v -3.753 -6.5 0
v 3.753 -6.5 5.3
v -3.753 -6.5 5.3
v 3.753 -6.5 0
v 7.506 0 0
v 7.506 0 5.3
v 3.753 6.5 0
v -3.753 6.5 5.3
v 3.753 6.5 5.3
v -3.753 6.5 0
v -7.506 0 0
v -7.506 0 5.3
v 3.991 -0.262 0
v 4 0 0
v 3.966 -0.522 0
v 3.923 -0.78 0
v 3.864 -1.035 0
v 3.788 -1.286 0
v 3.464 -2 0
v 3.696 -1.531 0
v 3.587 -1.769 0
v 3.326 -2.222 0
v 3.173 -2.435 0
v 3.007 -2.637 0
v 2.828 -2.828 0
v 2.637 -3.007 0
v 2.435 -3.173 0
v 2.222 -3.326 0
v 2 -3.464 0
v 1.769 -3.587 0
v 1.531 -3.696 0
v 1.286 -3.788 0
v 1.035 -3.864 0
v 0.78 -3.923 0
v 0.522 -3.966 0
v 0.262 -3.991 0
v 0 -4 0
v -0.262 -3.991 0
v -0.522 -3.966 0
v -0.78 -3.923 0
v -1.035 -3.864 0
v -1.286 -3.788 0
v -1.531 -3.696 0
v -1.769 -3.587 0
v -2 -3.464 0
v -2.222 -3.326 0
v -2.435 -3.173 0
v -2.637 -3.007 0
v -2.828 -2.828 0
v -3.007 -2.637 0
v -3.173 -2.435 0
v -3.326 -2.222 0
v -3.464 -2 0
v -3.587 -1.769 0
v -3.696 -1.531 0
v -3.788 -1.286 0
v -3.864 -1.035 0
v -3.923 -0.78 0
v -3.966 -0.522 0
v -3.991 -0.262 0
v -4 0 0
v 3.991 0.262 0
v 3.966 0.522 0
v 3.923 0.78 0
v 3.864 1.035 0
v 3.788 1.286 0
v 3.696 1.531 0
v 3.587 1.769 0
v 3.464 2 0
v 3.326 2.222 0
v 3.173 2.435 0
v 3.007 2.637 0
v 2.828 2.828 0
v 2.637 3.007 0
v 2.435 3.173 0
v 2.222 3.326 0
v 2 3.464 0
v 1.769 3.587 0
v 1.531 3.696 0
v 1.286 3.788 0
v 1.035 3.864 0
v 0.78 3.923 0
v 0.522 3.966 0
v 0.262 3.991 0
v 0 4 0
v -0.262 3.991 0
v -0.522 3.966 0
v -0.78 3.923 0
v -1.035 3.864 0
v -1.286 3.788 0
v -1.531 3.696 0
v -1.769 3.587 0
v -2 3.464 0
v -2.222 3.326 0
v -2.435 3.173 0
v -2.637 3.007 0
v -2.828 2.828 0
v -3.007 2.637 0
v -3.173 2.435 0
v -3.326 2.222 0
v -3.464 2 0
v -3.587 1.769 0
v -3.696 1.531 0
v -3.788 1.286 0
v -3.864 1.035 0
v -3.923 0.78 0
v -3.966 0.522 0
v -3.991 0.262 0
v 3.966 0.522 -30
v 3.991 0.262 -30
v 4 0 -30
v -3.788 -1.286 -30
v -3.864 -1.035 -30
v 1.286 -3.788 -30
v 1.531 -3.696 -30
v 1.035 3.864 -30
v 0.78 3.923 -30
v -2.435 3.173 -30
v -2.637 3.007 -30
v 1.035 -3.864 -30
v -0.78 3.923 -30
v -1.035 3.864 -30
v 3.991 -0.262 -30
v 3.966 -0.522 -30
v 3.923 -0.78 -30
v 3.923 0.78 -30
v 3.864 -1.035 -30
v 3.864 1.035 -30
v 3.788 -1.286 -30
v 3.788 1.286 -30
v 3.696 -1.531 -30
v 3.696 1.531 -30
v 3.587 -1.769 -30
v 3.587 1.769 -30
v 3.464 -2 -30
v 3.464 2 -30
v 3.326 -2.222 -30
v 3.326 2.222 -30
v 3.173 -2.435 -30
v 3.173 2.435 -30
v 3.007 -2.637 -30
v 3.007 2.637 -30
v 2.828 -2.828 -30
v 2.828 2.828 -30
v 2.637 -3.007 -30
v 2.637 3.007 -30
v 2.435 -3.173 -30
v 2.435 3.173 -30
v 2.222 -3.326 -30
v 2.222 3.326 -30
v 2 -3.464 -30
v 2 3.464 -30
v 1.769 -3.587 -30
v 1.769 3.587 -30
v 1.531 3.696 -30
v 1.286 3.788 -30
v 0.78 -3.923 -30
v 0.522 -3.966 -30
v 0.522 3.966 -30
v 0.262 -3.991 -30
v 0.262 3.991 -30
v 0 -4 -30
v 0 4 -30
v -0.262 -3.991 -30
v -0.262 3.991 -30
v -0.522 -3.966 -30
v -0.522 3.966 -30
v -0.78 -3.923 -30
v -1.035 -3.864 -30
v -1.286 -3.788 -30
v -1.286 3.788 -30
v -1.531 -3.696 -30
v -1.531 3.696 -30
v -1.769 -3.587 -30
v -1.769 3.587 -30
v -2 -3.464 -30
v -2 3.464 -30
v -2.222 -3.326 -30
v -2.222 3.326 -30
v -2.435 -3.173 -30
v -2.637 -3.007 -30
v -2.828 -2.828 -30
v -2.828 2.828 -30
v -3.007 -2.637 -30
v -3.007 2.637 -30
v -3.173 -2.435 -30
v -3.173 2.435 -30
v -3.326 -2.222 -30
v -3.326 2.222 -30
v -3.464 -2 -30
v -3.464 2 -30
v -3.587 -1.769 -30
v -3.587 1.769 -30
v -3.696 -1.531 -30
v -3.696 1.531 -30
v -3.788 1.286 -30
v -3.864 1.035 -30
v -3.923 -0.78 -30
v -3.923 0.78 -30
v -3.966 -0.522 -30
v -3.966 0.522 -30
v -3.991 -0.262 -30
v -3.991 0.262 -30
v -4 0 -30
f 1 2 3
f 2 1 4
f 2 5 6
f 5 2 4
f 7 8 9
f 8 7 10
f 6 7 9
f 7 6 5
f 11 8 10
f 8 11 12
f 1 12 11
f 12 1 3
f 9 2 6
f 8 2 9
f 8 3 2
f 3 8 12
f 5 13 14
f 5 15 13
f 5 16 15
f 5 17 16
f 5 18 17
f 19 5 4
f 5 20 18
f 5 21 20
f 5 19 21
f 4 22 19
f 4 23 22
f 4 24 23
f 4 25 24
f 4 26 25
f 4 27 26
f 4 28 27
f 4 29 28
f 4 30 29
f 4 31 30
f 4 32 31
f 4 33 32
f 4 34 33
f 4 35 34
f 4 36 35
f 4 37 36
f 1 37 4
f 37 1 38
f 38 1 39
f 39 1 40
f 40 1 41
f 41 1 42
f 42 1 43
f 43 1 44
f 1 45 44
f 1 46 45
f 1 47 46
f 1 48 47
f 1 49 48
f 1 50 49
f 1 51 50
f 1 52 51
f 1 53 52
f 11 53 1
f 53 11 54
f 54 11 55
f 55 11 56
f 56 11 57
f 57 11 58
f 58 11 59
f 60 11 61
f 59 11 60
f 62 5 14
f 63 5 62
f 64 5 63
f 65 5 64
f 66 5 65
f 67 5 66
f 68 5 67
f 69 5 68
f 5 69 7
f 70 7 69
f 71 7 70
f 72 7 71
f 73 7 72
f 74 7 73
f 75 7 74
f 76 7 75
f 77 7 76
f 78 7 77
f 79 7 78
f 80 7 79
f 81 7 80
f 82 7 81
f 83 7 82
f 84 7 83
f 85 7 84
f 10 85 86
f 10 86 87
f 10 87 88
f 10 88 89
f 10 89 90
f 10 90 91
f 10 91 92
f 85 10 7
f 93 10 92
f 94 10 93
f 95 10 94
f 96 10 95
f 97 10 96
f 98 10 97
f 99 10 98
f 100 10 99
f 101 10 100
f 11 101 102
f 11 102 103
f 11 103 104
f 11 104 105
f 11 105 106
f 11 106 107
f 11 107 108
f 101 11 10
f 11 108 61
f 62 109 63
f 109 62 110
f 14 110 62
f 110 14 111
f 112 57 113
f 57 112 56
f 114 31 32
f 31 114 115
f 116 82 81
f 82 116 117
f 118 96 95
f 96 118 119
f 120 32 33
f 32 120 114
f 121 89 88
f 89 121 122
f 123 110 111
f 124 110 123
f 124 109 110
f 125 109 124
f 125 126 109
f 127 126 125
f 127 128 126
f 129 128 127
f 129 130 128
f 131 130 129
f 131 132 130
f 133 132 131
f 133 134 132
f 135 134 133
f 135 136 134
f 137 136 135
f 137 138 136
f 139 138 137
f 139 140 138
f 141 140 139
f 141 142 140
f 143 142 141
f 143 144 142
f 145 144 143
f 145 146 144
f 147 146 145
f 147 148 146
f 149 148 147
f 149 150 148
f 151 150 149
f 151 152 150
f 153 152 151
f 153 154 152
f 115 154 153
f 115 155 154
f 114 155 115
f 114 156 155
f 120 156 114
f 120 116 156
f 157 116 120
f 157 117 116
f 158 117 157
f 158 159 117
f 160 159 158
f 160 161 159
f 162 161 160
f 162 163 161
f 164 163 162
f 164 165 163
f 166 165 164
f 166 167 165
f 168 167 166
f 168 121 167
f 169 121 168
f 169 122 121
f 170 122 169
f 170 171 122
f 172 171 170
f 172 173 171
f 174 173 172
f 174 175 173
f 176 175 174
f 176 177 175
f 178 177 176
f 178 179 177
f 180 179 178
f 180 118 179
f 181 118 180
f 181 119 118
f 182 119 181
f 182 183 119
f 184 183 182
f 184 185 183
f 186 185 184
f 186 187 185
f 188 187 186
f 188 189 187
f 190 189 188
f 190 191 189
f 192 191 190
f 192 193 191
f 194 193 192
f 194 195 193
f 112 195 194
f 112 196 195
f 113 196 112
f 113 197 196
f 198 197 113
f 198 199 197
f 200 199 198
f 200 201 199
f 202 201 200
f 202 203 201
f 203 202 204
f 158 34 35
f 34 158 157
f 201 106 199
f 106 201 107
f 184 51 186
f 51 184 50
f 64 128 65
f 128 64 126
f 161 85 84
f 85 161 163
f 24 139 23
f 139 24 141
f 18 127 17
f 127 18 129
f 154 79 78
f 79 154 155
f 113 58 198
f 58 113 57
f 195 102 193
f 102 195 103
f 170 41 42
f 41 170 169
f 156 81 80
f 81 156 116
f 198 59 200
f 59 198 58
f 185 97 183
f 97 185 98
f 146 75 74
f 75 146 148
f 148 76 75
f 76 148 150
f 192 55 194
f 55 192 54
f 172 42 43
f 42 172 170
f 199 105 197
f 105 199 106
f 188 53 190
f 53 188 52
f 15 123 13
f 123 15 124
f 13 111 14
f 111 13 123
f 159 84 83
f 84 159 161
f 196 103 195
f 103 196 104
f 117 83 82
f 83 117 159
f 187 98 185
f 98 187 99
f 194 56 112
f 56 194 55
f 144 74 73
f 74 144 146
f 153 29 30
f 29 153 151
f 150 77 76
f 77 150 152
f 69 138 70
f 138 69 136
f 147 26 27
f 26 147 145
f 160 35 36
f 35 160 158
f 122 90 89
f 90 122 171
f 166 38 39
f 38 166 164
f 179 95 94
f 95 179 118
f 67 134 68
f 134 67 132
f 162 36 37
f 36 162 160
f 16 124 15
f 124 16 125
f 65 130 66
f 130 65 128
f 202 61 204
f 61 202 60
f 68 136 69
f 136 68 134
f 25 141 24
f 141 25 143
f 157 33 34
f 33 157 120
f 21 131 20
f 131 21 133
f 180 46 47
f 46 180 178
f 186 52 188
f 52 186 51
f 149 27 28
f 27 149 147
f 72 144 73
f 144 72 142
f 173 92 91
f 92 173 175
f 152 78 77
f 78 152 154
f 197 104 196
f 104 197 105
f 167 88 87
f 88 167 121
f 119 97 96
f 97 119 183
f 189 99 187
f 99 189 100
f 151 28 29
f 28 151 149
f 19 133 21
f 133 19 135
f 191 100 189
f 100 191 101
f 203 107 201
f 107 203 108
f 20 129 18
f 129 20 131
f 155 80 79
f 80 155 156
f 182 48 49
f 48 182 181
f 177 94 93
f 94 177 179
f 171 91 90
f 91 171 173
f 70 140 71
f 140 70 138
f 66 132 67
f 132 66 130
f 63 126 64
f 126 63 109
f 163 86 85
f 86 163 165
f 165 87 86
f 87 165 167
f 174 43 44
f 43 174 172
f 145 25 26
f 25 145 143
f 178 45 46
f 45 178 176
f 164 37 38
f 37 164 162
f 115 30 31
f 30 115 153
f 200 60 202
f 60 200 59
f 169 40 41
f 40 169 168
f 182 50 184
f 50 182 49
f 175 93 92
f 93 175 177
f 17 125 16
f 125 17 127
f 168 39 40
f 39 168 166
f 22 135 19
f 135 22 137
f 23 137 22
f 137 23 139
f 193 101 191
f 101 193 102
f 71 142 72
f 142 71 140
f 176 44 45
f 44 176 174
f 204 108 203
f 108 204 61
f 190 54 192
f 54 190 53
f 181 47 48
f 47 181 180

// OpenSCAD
head_across_flats = 13;
head_height = 5.3;
shank_diameter = 8;
shank_length = 30;

union() {
    // Hexagonal head: z = 0 to 5.3
    cylinder(
        h = head_height,
        r = head_across_flats / sqrt(3),
        $fn = 6
    );

    // Cylindrical shank: z = -30 to 0
    translate([0, 0, -shank_length])
        cylinder(
            h = shank_length,
            d = shank_diameter,
            $fn = 96
        );
}
